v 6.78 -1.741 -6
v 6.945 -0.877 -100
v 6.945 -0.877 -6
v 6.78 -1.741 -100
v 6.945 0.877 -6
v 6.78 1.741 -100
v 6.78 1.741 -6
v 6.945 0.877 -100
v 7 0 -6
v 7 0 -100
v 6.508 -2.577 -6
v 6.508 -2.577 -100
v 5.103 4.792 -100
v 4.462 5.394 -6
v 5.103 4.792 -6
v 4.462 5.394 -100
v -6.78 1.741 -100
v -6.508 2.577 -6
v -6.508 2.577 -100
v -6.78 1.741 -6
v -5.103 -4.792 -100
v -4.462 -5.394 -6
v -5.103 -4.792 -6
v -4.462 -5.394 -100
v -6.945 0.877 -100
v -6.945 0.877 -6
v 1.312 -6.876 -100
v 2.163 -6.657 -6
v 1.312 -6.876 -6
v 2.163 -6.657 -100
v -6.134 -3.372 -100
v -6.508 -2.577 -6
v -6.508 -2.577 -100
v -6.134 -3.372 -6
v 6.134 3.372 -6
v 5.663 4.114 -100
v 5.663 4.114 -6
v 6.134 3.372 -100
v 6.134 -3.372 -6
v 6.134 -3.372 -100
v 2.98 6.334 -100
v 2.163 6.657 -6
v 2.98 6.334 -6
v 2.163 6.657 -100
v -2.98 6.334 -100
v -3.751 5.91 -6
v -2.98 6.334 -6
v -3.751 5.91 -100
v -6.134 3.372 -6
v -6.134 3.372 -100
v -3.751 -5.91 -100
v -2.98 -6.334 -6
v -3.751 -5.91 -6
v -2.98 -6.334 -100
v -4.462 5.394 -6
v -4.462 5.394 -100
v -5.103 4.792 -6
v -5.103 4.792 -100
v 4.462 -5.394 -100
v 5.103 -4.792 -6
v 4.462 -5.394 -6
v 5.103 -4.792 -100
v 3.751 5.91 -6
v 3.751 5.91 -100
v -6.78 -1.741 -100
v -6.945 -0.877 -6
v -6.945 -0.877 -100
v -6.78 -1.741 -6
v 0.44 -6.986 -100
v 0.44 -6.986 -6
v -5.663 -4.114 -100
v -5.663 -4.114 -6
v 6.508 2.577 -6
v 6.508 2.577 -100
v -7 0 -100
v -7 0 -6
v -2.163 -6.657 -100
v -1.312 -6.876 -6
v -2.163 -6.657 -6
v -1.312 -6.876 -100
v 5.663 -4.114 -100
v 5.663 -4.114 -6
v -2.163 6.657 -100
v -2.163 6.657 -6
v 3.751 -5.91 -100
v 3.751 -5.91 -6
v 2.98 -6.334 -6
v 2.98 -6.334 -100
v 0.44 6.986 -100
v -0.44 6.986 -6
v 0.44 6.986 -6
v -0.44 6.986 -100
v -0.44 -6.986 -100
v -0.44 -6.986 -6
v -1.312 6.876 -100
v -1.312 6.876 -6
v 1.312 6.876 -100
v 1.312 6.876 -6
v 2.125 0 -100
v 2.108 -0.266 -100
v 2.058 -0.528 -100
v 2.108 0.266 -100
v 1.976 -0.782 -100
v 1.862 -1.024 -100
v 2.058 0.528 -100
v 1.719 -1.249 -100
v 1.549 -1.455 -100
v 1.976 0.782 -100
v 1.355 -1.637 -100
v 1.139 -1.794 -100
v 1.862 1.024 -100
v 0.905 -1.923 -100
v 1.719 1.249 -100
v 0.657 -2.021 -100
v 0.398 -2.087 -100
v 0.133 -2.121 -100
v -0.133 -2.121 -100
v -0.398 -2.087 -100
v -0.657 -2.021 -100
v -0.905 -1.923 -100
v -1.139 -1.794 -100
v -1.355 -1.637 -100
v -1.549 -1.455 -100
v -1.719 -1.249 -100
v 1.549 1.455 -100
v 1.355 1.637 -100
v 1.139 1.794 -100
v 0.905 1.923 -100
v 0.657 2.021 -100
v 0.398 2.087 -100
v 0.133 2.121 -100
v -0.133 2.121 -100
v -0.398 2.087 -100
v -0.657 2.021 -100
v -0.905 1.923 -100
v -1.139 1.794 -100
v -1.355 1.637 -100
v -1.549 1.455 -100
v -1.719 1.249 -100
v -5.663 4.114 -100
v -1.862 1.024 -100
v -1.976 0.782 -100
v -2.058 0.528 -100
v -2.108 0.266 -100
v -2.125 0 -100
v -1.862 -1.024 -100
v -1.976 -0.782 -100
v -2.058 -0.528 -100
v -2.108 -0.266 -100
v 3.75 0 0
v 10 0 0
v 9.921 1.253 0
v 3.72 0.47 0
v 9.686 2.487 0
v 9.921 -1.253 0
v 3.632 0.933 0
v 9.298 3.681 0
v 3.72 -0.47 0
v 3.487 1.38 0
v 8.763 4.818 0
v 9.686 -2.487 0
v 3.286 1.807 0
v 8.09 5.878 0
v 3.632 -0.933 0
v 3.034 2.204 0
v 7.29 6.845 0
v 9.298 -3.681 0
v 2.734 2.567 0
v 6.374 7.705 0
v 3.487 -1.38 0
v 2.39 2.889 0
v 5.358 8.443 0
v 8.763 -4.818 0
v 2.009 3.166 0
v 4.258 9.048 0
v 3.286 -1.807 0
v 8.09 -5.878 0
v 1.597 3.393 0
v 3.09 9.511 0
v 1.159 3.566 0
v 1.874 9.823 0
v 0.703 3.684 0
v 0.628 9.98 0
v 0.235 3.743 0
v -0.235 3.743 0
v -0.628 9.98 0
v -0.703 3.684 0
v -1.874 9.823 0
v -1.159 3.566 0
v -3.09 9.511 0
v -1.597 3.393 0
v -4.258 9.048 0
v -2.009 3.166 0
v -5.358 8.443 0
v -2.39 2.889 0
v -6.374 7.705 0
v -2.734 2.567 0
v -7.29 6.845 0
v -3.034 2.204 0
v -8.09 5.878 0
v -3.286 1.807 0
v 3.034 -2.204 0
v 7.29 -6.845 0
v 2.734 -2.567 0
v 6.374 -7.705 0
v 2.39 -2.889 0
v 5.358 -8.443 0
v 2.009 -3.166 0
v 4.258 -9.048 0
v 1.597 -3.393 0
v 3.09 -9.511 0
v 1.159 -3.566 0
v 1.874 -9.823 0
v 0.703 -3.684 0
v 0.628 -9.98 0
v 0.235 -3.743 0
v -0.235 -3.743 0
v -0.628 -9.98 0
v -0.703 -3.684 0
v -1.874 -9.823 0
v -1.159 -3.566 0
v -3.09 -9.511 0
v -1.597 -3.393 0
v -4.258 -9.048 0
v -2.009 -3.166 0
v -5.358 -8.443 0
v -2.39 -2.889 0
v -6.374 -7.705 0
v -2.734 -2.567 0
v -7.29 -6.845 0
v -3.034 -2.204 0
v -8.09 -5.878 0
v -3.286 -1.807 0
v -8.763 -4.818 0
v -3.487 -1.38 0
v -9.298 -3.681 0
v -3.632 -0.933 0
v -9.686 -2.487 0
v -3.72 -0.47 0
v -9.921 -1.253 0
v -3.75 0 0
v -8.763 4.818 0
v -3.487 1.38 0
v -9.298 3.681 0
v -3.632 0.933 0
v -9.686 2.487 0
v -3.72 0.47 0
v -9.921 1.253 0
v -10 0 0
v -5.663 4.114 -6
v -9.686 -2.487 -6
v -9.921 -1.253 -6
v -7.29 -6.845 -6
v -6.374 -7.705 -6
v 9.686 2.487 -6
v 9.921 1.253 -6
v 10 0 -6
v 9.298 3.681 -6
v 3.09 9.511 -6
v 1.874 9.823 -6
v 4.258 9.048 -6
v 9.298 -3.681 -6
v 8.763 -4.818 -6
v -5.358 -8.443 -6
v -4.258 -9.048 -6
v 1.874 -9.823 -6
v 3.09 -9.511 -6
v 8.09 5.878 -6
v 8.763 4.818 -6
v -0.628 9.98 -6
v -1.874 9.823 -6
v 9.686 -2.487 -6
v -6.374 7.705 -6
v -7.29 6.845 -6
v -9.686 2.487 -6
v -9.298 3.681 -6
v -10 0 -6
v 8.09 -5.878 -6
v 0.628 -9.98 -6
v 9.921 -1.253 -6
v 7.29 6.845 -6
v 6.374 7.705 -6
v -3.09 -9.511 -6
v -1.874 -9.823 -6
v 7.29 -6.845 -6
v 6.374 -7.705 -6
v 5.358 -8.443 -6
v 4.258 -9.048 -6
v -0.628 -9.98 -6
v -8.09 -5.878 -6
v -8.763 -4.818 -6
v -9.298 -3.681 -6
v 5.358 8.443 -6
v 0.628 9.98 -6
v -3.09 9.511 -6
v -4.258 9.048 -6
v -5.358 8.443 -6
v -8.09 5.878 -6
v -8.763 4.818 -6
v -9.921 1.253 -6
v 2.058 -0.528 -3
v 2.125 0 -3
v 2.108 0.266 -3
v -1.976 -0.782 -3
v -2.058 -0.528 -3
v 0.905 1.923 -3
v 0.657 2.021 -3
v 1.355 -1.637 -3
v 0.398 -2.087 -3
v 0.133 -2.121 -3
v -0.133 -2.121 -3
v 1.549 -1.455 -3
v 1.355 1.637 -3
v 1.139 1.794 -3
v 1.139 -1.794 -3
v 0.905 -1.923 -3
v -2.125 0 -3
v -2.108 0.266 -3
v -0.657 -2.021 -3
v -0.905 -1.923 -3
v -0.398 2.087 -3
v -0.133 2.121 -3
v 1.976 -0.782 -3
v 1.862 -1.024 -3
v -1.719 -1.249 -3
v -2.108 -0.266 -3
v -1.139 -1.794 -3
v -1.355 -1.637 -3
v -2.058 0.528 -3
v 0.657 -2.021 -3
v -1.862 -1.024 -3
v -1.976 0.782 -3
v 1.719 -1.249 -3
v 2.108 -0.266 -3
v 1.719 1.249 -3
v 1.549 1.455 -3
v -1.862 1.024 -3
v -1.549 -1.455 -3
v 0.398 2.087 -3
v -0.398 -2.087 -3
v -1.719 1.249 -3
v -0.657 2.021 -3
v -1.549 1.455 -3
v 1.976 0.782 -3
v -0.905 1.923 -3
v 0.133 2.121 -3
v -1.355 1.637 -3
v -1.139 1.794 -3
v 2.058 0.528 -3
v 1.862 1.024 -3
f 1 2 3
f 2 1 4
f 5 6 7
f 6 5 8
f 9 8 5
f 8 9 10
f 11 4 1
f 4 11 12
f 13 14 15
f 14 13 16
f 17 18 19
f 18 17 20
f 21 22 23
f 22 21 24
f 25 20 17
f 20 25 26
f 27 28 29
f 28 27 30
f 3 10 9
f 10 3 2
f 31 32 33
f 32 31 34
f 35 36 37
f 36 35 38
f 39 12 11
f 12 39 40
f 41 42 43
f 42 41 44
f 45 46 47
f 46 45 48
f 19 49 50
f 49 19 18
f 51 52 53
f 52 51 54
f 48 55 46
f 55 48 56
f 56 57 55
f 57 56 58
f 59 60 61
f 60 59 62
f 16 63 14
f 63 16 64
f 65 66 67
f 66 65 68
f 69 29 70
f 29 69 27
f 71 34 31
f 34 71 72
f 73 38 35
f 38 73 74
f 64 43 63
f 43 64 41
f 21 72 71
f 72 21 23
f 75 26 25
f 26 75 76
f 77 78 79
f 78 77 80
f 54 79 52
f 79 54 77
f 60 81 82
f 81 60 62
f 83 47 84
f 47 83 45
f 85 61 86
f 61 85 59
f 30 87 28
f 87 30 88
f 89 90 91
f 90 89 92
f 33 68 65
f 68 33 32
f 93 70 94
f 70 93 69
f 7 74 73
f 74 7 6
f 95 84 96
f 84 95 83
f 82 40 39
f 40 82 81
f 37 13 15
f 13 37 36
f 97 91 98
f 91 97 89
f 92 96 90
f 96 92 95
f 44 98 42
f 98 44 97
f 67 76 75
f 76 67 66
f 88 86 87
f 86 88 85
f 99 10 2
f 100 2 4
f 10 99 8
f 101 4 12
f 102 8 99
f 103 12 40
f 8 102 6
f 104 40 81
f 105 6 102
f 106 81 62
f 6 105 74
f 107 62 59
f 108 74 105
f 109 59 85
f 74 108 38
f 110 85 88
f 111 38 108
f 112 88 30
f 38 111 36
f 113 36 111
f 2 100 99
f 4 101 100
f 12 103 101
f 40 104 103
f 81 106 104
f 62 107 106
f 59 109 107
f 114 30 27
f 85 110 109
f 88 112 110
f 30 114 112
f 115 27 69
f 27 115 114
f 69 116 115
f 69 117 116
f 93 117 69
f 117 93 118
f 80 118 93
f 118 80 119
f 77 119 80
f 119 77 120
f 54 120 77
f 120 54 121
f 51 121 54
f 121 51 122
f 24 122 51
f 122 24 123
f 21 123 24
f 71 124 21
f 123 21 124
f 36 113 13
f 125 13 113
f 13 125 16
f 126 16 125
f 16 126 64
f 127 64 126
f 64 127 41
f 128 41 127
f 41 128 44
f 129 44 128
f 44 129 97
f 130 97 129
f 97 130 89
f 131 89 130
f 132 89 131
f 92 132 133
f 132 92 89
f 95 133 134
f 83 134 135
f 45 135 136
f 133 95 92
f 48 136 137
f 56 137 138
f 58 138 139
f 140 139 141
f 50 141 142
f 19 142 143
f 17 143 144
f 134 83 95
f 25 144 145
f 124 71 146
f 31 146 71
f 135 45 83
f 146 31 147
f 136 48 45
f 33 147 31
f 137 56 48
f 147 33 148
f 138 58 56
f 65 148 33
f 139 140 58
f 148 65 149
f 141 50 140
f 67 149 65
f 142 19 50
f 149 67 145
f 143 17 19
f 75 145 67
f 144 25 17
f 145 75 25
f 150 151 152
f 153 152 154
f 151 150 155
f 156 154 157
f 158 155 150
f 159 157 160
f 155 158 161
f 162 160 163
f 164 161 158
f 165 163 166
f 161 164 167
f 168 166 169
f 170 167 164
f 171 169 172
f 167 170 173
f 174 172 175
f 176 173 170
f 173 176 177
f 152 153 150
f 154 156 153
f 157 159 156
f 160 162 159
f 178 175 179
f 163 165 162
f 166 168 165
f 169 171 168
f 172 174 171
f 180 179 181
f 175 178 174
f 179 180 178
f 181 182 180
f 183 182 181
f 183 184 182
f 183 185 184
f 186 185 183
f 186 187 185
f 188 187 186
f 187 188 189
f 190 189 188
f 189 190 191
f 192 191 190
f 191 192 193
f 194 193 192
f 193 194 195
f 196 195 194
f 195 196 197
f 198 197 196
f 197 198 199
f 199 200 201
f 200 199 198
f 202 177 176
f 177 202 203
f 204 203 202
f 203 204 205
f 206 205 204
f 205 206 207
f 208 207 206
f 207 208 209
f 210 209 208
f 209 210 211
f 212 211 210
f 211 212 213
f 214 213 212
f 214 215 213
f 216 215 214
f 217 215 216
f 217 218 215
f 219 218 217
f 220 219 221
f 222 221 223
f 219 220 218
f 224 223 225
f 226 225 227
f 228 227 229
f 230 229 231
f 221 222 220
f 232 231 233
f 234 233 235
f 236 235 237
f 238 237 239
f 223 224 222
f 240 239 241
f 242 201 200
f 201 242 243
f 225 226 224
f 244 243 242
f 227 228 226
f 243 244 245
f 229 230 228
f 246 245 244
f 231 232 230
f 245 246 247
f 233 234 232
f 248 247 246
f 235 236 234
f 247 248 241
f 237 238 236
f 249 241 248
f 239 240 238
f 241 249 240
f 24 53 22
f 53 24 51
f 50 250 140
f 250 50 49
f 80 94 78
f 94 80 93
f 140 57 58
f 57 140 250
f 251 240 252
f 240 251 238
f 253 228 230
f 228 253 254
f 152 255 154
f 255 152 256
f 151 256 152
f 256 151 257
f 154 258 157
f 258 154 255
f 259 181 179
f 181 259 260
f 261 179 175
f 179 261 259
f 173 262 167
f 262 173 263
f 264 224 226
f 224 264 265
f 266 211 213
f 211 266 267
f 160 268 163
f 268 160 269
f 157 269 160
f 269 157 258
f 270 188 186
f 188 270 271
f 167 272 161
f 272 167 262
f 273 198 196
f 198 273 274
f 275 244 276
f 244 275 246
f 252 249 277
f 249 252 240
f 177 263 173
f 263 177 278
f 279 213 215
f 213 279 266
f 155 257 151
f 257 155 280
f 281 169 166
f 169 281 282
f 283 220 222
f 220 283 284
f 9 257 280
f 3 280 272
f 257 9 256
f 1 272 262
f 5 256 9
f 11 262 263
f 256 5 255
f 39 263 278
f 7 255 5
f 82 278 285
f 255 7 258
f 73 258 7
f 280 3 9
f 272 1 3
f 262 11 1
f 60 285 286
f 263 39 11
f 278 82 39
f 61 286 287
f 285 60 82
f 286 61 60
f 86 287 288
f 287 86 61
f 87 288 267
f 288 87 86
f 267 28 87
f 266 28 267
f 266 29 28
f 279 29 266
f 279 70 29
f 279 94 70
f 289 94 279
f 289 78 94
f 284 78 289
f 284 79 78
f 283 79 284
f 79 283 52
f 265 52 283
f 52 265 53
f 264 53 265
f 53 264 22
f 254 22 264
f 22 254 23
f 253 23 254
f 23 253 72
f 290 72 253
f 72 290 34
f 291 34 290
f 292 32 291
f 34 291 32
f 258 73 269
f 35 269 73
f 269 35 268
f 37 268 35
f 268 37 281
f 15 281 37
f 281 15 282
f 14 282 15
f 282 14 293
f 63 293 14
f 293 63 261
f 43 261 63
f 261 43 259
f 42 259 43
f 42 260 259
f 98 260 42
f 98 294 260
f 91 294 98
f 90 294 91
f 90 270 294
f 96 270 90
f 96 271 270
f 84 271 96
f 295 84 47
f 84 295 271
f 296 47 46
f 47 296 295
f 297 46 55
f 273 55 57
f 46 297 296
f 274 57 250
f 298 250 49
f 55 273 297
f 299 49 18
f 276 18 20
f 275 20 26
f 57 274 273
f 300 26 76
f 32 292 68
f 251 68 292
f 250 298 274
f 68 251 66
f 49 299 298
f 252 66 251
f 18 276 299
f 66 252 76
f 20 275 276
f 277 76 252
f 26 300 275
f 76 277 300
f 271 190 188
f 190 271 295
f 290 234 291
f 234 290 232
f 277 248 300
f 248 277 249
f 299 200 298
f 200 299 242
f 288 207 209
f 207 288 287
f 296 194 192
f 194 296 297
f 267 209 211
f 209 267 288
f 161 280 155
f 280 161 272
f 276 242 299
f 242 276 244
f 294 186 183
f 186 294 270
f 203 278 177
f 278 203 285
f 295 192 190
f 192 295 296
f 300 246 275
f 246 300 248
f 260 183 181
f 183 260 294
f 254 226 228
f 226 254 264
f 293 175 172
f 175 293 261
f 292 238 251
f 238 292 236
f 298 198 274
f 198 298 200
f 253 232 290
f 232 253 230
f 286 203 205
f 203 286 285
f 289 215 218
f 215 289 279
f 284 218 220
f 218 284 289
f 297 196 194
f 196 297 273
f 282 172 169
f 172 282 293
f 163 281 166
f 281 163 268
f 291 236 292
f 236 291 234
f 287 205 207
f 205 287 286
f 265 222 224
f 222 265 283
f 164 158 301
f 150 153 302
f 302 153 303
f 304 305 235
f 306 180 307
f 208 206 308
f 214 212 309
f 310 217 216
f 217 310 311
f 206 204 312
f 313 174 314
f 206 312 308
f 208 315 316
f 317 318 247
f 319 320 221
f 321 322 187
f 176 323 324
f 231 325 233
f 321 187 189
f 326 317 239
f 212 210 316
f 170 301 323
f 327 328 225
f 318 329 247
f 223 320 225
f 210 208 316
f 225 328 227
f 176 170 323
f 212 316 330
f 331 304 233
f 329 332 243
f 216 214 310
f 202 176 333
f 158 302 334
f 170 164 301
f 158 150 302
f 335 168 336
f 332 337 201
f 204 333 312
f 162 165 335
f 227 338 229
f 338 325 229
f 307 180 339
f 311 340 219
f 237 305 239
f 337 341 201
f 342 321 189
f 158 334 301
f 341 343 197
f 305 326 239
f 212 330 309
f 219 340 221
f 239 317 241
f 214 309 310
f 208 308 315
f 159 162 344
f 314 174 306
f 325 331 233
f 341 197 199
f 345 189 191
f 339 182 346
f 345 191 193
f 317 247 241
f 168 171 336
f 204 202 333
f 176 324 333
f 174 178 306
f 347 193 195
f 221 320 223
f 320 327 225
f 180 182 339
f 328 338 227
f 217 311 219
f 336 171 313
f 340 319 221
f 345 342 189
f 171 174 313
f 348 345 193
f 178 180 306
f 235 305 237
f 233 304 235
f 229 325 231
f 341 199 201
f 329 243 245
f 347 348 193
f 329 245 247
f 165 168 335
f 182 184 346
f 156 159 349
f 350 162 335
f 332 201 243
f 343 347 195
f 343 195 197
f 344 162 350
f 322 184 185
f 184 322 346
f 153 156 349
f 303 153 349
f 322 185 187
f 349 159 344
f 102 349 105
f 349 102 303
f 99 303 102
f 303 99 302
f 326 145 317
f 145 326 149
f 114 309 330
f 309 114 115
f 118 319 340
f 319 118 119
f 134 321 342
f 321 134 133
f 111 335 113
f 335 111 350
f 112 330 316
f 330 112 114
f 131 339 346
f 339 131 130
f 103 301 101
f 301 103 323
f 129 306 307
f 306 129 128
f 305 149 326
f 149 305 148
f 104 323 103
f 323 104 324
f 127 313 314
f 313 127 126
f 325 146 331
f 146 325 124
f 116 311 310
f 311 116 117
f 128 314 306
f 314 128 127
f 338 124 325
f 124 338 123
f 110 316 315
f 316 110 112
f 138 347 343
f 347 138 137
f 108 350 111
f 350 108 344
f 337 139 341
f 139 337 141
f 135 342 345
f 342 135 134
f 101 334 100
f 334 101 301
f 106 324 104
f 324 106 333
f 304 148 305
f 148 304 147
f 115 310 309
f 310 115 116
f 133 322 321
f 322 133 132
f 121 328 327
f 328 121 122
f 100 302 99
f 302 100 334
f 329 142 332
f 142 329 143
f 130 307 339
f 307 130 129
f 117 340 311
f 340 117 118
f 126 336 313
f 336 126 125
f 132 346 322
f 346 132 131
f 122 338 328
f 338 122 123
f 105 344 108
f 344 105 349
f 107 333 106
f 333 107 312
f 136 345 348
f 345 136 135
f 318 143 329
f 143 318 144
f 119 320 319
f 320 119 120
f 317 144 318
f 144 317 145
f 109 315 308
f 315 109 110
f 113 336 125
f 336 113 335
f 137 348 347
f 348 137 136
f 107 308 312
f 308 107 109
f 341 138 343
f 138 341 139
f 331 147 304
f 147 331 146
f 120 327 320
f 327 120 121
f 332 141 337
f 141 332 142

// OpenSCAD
$fn = 50;


difference() {
	union() {
		translate(v = [0, 0, -100.0000000000]) {
			cylinder(h = 100, r = 7.0000000000);
		}
		translate(v = [0, 0, -6.0000000000]) {
			cylinder(h = 6, r = 10.0000000000);
		}
	}
	union() {
		translate(v = [0, 0, 0]) {
			rotate(a = [0, 0, 0]) {
				difference() {
					union() {
						#translate(v = [0, 0, -100.0000000000]) {
							cylinder(h = 100, r = 2.0000000000);
						}
						#translate(v = [0, 0, -3]) {
							cylinder(h = 3, r1 = 2.1250000000, r2 = 3.7500000000);
						}
						#translate(v = [0, 0, -100.0000000000]) {
							cylinder(h = 100, r = 2.1250000000);
						}
						#translate(v = [0, 0, -100.0000000000]) {
							cylinder(h = 100, r = 2.0000000000);
						}
					}
					union();
				}
			}
		}
	}
}
